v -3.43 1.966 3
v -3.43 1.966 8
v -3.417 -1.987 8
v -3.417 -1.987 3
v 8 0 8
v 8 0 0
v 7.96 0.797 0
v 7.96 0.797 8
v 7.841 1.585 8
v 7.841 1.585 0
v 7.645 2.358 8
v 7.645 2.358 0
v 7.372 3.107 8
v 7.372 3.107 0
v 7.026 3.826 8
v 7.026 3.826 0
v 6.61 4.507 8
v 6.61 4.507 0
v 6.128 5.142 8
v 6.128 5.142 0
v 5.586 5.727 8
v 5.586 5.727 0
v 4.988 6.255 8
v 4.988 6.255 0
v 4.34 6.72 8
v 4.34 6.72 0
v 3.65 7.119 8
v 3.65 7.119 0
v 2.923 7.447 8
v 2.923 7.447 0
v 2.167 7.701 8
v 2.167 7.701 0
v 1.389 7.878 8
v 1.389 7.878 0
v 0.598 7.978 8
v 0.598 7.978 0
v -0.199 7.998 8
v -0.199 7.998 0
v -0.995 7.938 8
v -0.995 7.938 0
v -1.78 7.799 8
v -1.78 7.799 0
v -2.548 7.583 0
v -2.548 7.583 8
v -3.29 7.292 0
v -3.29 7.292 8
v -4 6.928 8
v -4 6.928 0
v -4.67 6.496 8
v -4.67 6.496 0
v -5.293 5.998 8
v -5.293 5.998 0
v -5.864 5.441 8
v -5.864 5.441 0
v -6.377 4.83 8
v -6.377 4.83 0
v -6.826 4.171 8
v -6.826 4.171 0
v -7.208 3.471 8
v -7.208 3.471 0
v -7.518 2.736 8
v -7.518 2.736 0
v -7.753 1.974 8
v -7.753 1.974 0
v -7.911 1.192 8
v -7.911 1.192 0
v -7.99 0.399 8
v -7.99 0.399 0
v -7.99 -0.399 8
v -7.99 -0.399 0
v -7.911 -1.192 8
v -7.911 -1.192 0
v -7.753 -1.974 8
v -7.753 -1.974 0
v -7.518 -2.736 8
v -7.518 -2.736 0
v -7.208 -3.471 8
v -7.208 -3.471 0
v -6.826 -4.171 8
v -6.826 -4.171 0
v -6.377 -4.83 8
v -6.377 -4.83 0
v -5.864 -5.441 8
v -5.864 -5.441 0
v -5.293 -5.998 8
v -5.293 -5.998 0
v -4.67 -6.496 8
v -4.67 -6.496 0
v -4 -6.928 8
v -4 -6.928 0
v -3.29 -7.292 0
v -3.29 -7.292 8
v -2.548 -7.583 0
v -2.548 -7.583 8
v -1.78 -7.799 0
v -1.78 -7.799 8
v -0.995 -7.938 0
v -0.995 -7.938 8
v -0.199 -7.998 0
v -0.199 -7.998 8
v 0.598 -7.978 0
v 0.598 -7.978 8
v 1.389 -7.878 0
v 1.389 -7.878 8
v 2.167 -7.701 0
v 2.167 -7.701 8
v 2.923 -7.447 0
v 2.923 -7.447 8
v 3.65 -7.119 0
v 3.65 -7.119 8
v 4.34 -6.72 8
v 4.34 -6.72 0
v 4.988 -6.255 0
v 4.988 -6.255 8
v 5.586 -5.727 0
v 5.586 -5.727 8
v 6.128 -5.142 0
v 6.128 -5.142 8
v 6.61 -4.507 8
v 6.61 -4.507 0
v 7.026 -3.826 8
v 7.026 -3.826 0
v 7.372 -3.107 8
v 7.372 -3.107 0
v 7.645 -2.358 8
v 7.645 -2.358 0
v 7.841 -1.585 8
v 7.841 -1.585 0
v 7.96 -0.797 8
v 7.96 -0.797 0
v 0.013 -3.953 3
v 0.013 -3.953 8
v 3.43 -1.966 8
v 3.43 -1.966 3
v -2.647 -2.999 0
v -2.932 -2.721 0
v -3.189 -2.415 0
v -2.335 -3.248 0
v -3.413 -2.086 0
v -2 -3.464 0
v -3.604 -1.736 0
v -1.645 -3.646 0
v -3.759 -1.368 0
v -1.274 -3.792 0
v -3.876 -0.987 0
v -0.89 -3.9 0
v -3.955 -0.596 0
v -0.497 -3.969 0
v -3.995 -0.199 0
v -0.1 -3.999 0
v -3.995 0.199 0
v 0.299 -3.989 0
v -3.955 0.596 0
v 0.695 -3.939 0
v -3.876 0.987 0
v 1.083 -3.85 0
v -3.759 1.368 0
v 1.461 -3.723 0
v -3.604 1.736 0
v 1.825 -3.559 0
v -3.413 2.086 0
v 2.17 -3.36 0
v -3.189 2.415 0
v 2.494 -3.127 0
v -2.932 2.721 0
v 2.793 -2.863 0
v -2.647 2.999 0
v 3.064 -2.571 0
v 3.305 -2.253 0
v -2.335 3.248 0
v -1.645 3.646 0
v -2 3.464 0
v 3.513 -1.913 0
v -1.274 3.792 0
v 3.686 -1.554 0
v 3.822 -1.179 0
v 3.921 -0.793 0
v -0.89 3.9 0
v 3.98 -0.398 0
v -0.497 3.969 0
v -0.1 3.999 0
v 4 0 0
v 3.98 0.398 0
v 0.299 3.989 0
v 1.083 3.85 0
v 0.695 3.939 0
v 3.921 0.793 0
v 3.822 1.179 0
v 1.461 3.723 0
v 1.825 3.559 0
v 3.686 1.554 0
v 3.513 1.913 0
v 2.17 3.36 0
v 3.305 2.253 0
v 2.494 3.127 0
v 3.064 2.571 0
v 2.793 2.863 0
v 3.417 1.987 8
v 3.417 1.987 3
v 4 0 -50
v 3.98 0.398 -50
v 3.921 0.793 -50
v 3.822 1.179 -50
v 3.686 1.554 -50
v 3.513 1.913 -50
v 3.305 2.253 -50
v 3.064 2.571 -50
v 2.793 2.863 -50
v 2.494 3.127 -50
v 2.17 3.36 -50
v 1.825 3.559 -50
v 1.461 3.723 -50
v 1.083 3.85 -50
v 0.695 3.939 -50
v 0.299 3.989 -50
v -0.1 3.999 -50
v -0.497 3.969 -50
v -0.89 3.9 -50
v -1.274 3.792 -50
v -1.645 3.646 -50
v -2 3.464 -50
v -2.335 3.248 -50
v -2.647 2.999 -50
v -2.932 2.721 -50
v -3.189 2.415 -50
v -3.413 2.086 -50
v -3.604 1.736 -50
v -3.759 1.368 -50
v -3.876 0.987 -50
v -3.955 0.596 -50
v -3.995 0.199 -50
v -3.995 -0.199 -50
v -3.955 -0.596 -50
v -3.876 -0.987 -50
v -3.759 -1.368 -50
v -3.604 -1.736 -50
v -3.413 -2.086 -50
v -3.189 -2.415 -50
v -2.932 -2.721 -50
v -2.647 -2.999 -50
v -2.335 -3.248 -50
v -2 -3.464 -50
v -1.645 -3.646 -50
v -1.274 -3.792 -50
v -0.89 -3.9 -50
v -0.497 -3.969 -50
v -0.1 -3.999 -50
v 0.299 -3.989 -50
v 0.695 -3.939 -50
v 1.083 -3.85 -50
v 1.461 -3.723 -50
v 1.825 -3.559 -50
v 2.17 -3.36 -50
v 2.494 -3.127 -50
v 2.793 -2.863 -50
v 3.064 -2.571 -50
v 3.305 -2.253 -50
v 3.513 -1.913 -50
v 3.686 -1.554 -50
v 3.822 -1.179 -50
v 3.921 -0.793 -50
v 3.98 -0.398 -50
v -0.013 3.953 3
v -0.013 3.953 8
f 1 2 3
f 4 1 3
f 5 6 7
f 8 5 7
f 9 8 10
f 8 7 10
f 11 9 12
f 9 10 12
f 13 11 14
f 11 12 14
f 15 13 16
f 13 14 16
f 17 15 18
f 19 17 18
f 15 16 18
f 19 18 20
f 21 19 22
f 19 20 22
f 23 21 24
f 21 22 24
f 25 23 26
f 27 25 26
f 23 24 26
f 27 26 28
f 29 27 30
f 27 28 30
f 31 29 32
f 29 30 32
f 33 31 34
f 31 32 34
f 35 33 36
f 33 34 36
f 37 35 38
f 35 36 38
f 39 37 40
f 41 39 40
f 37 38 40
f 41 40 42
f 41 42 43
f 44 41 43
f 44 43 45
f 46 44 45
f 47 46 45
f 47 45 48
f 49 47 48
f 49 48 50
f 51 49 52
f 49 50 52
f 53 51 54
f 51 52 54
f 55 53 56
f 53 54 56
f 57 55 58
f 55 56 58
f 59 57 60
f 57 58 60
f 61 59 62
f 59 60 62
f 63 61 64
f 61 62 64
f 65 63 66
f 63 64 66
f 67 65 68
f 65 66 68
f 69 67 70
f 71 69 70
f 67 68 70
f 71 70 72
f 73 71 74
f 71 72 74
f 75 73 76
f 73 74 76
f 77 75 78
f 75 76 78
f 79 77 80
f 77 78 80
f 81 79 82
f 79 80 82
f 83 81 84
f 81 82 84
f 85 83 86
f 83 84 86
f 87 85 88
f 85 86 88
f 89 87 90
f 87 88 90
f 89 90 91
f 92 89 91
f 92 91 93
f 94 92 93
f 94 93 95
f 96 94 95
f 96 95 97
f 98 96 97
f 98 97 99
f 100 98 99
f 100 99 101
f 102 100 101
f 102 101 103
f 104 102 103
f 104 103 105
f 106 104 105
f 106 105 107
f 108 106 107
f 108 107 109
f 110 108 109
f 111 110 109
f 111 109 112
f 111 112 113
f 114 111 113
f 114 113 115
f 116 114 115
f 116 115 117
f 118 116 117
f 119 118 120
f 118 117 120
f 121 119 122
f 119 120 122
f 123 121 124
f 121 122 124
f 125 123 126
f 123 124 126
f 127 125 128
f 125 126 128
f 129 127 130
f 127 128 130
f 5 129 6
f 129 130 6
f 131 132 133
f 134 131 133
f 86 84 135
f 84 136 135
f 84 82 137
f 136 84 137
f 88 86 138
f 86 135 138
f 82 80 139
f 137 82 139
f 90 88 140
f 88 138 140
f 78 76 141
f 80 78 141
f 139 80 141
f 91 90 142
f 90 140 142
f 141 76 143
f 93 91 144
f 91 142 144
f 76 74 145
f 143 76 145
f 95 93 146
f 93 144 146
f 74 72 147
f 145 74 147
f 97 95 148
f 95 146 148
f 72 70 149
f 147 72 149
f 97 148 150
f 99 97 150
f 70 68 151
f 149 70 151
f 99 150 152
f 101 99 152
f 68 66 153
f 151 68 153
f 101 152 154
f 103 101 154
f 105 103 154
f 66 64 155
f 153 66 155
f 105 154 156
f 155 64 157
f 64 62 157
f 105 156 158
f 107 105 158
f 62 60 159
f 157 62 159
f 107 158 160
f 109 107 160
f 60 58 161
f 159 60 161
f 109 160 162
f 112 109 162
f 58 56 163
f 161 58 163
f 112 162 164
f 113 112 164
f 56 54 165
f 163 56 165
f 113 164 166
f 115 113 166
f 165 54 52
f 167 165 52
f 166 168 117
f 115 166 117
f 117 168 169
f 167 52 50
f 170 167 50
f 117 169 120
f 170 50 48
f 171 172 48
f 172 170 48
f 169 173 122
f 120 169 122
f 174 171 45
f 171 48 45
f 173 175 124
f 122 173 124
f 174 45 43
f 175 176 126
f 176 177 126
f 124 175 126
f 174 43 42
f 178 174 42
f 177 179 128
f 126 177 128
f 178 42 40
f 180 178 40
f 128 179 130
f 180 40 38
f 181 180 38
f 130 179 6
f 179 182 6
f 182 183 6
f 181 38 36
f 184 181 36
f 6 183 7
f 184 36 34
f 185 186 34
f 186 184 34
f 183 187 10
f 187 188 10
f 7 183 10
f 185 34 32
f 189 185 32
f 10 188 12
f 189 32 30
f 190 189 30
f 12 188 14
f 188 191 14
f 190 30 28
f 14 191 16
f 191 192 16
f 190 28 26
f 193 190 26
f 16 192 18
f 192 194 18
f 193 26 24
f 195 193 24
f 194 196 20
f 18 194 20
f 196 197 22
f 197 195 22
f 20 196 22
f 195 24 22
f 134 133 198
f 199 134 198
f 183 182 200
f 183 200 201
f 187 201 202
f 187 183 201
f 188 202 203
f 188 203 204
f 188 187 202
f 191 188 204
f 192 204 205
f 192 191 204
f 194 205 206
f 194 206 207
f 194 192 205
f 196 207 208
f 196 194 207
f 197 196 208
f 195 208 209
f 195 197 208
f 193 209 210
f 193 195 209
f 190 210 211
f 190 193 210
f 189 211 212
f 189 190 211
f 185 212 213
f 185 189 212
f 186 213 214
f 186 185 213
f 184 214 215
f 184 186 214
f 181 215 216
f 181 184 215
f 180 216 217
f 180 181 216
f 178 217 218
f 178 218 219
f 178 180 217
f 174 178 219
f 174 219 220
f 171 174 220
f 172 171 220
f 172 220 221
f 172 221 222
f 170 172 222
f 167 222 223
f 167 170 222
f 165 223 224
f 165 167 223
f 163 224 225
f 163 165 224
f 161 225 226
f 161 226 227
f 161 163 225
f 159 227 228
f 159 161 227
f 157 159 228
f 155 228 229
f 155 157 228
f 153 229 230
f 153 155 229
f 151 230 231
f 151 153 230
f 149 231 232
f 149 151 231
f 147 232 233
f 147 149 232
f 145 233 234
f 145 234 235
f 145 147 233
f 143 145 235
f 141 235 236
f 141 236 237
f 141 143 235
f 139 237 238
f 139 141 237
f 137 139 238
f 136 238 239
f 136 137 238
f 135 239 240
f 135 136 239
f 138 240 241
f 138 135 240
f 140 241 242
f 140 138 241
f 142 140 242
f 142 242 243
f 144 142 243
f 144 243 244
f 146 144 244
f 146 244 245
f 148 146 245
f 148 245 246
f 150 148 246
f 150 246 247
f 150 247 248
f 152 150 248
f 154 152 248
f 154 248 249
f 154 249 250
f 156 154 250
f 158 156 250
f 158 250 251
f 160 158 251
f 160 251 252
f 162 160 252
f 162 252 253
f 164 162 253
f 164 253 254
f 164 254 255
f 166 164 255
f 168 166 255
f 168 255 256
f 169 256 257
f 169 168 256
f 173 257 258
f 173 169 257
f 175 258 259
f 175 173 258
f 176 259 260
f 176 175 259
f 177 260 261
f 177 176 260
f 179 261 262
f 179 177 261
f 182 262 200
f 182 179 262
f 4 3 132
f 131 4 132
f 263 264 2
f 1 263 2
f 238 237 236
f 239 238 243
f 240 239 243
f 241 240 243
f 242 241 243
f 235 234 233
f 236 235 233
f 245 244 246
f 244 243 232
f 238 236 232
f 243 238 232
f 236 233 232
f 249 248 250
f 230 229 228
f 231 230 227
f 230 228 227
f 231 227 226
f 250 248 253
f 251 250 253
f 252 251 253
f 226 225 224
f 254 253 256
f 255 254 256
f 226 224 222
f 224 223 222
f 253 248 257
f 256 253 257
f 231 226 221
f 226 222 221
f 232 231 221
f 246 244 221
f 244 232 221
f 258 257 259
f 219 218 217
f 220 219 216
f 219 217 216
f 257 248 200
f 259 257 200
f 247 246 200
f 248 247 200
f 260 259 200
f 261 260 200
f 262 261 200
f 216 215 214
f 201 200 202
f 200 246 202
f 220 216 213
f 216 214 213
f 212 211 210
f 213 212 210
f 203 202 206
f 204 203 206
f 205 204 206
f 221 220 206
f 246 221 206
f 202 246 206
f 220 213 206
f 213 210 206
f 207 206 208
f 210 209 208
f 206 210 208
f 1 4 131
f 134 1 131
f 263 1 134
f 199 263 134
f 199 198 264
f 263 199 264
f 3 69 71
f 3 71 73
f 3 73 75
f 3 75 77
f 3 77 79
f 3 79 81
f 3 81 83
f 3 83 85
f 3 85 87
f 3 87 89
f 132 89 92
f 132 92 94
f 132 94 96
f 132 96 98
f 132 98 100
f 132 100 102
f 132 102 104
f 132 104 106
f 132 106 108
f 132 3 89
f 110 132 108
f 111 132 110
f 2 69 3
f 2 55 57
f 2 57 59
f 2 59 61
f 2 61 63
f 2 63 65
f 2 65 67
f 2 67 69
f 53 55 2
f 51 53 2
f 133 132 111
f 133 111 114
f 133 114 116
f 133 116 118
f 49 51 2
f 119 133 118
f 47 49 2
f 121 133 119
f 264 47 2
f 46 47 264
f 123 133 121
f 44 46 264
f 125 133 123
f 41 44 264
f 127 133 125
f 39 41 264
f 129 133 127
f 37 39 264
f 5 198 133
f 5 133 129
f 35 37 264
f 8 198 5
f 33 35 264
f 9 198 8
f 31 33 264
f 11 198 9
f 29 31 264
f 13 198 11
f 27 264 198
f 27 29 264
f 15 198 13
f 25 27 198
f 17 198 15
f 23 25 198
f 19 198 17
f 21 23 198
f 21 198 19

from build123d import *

# Parameters (mm, degrees)
F0_R     = 4
F1_DEPTH = 50
F0_R_2   = 8
F2_DEPTH = 8
F4_DEPTH = 5


with BuildPart() as f1:
    # F0 (on Top) → F1 (new body)
    with BuildSketch(Plane.XY):
        Circle(F0_R)
    extrude(amount=-F1_DEPTH)

    # F0 (on Top) → F2 (join)
    with BuildSketch(Plane.XY):
        Circle(F0_R_2)
        Circle(F0_R, mode=Mode.SUBTRACT)
        Circle(F0_R)
    extrude(amount=F2_DEPTH)

    # F3 (on face) → F4 (cut)
    with BuildSketch(Plane.XY.offset(8)):
        Polygon((-0.012543, 3.953086), (-3.429744, 1.965681), (-3.417202, -1.987405), (0.012543, -3.953086), (3.429744, -1.965681), (3.417202, 1.987405), align=None)
    extrude(amount=-F4_DEPTH, mode=Mode.SUBTRACT)


solid = f1.part
